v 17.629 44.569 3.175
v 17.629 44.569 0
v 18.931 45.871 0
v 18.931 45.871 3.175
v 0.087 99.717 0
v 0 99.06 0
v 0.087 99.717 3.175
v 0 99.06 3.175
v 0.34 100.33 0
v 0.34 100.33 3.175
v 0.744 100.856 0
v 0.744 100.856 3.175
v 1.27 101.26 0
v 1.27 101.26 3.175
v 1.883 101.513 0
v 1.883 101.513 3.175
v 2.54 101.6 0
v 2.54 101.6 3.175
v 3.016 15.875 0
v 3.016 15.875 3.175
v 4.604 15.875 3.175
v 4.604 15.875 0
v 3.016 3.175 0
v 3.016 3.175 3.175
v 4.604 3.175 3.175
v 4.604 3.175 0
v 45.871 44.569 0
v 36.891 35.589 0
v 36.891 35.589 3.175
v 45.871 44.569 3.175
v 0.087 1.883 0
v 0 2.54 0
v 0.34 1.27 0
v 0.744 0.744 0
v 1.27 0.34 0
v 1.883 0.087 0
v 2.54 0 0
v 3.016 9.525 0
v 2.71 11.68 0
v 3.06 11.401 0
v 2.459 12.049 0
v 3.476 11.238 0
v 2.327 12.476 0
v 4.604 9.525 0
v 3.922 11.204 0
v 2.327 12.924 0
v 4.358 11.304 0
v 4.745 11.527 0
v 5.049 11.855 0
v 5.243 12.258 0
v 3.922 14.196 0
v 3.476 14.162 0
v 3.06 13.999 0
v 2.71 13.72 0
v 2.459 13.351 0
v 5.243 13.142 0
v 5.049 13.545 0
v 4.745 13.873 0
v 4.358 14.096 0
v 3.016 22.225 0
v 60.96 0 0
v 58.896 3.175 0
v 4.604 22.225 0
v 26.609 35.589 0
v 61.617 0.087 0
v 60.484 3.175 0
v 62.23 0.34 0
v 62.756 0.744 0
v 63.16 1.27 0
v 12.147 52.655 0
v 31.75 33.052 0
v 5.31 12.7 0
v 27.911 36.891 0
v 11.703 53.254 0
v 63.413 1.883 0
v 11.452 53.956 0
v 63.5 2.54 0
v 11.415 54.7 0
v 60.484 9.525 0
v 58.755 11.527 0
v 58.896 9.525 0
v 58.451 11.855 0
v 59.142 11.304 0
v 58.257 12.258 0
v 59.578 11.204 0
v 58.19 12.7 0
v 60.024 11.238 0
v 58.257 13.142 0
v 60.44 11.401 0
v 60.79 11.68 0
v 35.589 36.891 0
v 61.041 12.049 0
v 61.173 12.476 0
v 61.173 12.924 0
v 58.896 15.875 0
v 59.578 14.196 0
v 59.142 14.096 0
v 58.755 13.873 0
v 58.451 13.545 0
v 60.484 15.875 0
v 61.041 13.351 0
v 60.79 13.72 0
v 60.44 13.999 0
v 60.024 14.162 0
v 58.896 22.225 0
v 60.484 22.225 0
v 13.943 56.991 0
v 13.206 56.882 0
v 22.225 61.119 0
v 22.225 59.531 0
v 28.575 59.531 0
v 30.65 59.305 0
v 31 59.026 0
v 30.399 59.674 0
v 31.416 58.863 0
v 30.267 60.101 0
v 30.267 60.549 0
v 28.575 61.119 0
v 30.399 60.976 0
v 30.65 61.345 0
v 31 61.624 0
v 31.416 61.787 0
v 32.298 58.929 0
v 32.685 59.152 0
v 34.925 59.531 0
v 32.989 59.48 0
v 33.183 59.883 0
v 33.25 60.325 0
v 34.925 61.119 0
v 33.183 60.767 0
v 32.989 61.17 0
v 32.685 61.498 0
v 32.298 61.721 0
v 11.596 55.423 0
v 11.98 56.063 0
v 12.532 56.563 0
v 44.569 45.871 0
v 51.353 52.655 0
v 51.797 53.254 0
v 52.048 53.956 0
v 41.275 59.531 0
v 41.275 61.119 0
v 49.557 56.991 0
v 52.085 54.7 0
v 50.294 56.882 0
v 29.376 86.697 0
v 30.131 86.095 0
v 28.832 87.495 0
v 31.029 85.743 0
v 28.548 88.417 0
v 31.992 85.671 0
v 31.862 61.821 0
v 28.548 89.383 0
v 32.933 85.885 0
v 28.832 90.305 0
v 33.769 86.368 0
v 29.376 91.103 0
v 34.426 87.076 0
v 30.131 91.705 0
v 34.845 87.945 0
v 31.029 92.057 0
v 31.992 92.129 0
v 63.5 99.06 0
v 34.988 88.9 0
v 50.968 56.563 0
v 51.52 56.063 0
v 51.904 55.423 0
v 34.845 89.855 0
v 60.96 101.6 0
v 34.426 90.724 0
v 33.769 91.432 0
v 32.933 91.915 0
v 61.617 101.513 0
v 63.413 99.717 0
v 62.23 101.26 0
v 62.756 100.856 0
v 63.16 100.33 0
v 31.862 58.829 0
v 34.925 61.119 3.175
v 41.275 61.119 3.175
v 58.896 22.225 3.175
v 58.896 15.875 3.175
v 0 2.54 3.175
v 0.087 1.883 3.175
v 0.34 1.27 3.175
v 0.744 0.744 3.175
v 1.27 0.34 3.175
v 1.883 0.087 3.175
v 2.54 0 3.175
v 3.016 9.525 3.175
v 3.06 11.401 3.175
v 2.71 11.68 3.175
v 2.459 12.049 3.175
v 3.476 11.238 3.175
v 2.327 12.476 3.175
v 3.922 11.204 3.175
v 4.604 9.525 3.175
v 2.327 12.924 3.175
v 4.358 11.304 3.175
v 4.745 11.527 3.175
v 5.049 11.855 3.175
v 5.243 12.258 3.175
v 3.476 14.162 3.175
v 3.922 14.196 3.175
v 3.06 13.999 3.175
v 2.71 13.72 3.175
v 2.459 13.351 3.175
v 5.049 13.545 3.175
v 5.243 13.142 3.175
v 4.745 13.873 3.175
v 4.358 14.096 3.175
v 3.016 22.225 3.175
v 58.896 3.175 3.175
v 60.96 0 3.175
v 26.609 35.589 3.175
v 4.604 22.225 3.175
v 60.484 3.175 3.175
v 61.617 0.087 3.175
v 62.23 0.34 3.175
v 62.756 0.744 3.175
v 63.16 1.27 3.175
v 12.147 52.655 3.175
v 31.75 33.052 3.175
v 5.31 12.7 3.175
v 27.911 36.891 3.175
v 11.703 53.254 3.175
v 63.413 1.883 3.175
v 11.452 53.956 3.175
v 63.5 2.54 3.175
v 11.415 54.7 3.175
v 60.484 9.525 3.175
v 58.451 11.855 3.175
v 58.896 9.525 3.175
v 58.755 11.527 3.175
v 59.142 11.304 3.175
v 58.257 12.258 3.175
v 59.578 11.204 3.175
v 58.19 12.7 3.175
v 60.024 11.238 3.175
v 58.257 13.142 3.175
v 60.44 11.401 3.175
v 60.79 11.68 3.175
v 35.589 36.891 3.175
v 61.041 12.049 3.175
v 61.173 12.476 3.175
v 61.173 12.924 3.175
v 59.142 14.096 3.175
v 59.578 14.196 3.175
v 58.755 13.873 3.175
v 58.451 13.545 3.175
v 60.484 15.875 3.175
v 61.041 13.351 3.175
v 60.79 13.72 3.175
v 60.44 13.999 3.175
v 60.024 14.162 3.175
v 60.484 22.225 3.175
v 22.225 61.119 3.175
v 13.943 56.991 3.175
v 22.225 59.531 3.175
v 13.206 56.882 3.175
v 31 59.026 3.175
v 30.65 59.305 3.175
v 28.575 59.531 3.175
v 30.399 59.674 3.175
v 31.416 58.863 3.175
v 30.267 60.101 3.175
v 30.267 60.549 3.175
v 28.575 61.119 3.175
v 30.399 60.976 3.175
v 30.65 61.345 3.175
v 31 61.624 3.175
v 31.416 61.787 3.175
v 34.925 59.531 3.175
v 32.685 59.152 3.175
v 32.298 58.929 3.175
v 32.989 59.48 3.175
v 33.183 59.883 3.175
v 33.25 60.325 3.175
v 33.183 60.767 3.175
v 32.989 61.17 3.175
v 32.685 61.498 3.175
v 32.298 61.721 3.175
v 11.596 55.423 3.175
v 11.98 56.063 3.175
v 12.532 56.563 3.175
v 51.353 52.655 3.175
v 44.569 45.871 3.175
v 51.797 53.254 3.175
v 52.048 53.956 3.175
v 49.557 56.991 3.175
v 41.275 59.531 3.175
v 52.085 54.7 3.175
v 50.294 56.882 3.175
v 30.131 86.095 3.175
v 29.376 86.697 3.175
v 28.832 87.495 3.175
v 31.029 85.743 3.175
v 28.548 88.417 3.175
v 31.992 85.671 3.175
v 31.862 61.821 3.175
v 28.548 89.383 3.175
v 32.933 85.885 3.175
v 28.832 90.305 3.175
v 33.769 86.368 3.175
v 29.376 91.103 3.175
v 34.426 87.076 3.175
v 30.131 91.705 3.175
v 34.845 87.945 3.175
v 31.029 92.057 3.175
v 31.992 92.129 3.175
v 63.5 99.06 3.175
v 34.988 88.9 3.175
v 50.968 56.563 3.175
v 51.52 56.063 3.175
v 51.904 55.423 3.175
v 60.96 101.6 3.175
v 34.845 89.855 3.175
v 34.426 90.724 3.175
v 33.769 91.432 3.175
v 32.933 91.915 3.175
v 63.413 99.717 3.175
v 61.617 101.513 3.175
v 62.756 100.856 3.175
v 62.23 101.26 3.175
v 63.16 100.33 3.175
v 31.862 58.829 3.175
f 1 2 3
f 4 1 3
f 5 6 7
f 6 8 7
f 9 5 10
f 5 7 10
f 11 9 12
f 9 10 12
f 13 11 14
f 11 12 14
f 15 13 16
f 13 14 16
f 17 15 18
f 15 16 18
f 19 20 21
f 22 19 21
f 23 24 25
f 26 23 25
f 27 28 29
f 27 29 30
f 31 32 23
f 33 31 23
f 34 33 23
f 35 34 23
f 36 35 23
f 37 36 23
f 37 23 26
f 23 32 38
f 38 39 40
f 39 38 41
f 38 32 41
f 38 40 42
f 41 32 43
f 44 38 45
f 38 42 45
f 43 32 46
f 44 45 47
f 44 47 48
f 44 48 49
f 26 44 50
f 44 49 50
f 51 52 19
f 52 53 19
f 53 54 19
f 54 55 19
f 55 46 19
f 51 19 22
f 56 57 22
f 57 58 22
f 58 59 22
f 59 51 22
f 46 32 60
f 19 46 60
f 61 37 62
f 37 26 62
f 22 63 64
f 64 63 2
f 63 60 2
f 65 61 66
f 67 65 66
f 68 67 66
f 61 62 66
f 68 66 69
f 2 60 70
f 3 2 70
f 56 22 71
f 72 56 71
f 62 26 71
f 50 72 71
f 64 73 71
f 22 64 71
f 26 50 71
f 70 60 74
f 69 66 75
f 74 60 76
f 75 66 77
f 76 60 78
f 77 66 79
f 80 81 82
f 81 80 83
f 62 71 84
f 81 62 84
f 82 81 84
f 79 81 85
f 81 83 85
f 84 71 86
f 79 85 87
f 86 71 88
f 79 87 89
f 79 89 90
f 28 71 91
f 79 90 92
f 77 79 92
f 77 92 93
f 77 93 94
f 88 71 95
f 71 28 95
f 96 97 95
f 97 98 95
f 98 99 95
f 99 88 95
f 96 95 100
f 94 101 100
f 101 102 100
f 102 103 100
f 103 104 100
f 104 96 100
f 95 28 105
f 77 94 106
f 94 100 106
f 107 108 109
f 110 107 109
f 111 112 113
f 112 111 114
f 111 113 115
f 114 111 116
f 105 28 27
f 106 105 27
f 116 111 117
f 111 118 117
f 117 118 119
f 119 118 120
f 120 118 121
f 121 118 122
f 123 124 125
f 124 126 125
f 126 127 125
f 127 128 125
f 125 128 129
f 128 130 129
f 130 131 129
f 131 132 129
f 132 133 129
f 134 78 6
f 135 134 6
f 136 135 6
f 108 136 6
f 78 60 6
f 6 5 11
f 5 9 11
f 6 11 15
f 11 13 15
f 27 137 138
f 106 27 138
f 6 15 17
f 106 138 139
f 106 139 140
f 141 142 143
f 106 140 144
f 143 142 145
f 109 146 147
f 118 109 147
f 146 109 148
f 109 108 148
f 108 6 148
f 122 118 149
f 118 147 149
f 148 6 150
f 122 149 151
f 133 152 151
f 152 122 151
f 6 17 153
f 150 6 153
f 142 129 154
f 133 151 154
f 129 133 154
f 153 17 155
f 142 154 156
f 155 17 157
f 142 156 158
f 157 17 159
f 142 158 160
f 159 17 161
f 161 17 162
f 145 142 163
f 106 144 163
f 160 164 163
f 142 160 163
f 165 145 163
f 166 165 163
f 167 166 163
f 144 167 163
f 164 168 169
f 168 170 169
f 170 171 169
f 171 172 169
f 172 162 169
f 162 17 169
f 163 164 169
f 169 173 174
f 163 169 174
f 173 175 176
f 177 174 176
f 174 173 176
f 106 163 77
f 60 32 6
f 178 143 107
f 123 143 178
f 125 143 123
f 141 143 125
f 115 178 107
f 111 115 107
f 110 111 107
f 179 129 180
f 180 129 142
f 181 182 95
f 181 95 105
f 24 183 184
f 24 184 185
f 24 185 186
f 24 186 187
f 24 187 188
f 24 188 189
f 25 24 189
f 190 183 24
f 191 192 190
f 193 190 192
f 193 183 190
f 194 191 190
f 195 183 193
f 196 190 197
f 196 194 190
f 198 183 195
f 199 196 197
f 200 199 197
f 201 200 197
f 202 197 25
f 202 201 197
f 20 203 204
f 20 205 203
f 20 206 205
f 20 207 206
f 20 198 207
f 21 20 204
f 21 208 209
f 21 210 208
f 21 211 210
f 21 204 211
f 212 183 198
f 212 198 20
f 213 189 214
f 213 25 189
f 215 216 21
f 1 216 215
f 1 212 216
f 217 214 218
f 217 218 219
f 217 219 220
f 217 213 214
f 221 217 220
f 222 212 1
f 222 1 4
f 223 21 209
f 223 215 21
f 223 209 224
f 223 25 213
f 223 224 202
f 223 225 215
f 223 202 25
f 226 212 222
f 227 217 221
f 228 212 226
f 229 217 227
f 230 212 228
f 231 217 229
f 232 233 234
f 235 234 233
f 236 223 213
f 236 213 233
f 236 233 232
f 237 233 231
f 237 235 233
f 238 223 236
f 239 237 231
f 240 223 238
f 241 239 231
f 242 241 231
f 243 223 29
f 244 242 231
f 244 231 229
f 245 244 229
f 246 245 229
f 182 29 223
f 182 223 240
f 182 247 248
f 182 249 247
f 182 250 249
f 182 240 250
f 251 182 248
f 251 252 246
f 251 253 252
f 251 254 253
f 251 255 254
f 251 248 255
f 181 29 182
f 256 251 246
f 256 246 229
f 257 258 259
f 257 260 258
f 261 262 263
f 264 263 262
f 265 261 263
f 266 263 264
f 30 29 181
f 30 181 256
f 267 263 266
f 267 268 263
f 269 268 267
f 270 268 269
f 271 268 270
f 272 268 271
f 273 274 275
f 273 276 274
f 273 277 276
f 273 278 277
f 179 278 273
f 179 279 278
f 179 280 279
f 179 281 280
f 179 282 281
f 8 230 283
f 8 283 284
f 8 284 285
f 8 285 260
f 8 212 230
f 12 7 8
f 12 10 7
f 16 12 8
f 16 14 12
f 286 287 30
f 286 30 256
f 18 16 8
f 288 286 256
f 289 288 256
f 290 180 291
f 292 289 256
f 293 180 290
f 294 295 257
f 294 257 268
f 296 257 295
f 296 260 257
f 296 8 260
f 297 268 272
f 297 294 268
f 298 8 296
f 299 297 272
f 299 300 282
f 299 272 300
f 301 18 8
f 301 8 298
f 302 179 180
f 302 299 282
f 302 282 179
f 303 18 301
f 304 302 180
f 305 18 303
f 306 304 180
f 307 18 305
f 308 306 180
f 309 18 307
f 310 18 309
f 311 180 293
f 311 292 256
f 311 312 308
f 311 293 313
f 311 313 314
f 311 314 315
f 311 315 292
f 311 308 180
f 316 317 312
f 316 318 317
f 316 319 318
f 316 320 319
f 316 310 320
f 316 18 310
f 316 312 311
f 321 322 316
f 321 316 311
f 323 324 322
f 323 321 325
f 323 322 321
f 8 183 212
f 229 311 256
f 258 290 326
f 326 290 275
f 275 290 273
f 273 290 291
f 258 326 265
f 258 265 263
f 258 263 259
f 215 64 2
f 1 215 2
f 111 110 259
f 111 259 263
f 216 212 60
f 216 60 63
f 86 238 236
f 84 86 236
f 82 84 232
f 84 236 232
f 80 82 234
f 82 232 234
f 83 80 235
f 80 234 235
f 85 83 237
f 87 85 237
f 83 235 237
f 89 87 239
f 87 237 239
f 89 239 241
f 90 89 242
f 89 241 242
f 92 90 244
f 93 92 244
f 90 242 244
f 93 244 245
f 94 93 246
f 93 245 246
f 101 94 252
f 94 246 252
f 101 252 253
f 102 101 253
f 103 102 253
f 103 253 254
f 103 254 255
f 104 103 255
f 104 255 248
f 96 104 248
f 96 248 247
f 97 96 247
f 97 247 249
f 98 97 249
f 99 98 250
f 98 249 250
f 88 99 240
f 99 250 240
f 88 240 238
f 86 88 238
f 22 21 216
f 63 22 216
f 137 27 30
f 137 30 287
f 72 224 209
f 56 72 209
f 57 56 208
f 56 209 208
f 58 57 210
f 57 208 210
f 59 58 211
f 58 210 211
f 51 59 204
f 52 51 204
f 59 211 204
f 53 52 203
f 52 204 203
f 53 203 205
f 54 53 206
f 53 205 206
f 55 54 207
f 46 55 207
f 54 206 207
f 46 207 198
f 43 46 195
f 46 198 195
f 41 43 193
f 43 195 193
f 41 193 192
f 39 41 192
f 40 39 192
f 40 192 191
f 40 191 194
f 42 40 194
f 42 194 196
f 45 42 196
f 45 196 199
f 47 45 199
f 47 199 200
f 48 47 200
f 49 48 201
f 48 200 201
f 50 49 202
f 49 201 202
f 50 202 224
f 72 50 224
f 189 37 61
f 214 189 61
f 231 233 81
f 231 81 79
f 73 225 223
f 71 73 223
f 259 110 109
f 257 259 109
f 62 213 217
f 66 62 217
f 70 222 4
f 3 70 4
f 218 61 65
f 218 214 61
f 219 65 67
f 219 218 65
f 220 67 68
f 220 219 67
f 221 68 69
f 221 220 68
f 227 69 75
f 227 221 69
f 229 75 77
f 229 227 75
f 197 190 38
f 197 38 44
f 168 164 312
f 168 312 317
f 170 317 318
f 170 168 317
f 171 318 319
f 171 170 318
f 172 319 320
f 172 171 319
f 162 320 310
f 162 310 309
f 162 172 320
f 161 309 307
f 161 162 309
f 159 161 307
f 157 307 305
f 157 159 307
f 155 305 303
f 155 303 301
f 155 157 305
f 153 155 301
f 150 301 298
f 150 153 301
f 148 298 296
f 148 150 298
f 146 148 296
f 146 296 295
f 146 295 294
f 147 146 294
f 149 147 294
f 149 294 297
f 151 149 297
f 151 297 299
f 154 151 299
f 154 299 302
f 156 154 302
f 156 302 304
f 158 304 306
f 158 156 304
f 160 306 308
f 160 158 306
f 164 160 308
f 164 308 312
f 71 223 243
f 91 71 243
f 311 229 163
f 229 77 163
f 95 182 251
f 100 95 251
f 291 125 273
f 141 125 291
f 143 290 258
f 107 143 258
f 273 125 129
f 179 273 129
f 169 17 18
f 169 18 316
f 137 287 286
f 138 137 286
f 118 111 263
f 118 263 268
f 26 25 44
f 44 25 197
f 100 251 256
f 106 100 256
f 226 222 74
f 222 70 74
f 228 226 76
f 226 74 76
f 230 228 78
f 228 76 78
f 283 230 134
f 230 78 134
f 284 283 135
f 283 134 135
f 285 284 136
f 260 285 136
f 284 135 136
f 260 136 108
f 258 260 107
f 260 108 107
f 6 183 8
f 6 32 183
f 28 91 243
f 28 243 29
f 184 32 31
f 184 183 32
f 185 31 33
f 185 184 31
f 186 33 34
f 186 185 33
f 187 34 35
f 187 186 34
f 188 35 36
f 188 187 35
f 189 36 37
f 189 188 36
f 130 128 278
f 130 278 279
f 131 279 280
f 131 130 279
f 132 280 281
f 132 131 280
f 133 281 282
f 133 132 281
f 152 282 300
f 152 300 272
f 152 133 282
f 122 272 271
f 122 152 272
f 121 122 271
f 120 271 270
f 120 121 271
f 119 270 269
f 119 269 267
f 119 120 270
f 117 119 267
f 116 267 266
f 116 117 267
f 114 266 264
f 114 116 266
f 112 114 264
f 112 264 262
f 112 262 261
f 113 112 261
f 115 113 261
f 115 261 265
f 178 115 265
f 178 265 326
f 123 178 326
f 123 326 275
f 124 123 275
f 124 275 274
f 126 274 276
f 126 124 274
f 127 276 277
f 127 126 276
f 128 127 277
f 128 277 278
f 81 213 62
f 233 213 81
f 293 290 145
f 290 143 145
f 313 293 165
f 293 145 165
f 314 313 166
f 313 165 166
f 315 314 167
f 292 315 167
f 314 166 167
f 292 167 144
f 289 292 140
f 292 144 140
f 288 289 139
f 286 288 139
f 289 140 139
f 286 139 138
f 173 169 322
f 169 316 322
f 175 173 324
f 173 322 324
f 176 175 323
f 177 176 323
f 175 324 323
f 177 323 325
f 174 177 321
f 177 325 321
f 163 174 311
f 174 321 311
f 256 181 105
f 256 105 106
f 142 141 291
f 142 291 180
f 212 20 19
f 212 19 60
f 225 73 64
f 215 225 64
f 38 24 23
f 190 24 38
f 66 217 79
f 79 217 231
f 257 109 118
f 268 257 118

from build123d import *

# Parameters (mm, degrees)
SKETCH1_W           = 63.5
SKETCH1_H           = 38.1
SKETCH1_R           = 5.08
SKETCH1_R_2         = 3.2385
SKETCH1_H_2         = 63.5
SKETCH1_R_3         = 1.5
SKETCH1_W_2         = 6.35
SKETCH1_H_3         = 1.5875
BOSS_EXTRUDE1_DEPTH = 3.175
CUT_EXTRUDE1_DEPTH  = 3.175
SKETCH3_R           = 1.5
SKETCH3_W           = 1.5875
SKETCH3_H           = 6.35
CUT_EXTRUDE2_DEPTH  = 3.175
FILLET1_R           = 2.54


with BuildPart() as part:
    # Sketch1 → Boss-Extrude1 (new body)
    # profile 1 of 4: a face of its own
    with BuildSketch(Plane.XY):
        with Locations((31.75, 82.55)):
            Rectangle(SKETCH1_W, SKETCH1_H)
        with Locations((31.75, 88.9)):
            Circle(SKETCH1_R, mode=Mode.SUBTRACT)
    # profile 2 of 4: a face of its own
    with BuildSketch(Plane.XY):
        with Locations((31.75, 82.55)):
            Rectangle(SKETCH1_W, SKETCH1_H)
        with Locations((31.75, 88.9)):
            Circle(SKETCH1_R, mode=Mode.SUBTRACT)
    # profile 3 of 4: a face of its own
    with BuildSketch(Plane.XY):
        with Locations((31.75, 88.9)):
            Circle(SKETCH1_R)
        with Locations((31.75, 88.9)):
            Circle(SKETCH1_R_2, mode=Mode.SUBTRACT)
    # profile 4 of 4: a face of its own
    with BuildSketch(Plane.XY):
        with Locations((31.75, 31.75)):
            Rectangle(SKETCH1_W, SKETCH1_H_2)
        with Locations((31.75, 60.325)):
            Circle(SKETCH1_R_3, mode=Mode.SUBTRACT)
        with Locations((38.1, 60.325)):
            Rectangle(SKETCH1_W_2, SKETCH1_H_3, mode=Mode.SUBTRACT)
        Polygon((27.910940508, 36.891196629), (26.608803371, 35.589059492), (17.62854725, 44.569315613), (18.930684387, 45.87145275), align=None, mode=Mode.SUBTRACT)
        Polygon((45.87145275, 44.569315613), (44.569315613, 45.87145275), (35.589059492, 36.891196629), (36.891196629, 35.589059492), align=None, mode=Mode.SUBTRACT)
        with Locations((25.4, 60.325)):
            Rectangle(SKETCH1_W_2, SKETCH1_H_3, mode=Mode.SUBTRACT)
    extrude(amount=BOSS_EXTRUDE1_DEPTH)

    # Sketch2 → Cut-Extrude1 (cut)
    with BuildSketch(Plane.XY.offset(3.175)):
        Polygon((27.910940508, 36.891196629), (31.75, 33.052137138), (35.589059492, 36.891196629), (44.569315613, 45.87145275), (55.689112862, 56.99125), (7.810887138, 56.99125), (18.930684387, 45.87145275), align=None)
    extrude(amount=-CUT_EXTRUDE1_DEPTH, mode=Mode.SUBTRACT)

    # Sketch3 → Cut-Extrude2 (cut)
    with BuildSketch(Plane.XY.offset(3.175)):
        with Locations((3.81, 12.7)):
            Circle(SKETCH3_R)
        with Locations(Location((59.69, 12.7, 0), (0, 0, 180))):
            Circle(SKETCH3_R)
        with Locations((3.81, 19.05)):
            Rectangle(SKETCH3_W, SKETCH3_H)
        with Locations((3.81, 6.35)):
            Rectangle(SKETCH3_W, SKETCH3_H)
        with Locations((59.69, 6.35)):
            Rectangle(SKETCH3_W, SKETCH3_H)
        with Locations((59.69, 19.05)):
            Rectangle(SKETCH3_W, SKETCH3_H)
    extrude(amount=-CUT_EXTRUDE2_DEPTH, mode=Mode.SUBTRACT)

    # Fillet1
    fillet1_edges = [part.edges().sort_by_distance(p)[0] for p in [
        (0, 101.6, 1.5875),
        (63.5, 101.6, 1.5875),
        (63.5, 0, 1.5875),
        (0, 0, 1.5875),
        (55.689112862, 56.99125, 1.5875),
        (7.810887138, 56.99125, 1.5875),
    ]]
    fillet(fillet1_edges, radius=FILLET1_R)


solid = part.part
